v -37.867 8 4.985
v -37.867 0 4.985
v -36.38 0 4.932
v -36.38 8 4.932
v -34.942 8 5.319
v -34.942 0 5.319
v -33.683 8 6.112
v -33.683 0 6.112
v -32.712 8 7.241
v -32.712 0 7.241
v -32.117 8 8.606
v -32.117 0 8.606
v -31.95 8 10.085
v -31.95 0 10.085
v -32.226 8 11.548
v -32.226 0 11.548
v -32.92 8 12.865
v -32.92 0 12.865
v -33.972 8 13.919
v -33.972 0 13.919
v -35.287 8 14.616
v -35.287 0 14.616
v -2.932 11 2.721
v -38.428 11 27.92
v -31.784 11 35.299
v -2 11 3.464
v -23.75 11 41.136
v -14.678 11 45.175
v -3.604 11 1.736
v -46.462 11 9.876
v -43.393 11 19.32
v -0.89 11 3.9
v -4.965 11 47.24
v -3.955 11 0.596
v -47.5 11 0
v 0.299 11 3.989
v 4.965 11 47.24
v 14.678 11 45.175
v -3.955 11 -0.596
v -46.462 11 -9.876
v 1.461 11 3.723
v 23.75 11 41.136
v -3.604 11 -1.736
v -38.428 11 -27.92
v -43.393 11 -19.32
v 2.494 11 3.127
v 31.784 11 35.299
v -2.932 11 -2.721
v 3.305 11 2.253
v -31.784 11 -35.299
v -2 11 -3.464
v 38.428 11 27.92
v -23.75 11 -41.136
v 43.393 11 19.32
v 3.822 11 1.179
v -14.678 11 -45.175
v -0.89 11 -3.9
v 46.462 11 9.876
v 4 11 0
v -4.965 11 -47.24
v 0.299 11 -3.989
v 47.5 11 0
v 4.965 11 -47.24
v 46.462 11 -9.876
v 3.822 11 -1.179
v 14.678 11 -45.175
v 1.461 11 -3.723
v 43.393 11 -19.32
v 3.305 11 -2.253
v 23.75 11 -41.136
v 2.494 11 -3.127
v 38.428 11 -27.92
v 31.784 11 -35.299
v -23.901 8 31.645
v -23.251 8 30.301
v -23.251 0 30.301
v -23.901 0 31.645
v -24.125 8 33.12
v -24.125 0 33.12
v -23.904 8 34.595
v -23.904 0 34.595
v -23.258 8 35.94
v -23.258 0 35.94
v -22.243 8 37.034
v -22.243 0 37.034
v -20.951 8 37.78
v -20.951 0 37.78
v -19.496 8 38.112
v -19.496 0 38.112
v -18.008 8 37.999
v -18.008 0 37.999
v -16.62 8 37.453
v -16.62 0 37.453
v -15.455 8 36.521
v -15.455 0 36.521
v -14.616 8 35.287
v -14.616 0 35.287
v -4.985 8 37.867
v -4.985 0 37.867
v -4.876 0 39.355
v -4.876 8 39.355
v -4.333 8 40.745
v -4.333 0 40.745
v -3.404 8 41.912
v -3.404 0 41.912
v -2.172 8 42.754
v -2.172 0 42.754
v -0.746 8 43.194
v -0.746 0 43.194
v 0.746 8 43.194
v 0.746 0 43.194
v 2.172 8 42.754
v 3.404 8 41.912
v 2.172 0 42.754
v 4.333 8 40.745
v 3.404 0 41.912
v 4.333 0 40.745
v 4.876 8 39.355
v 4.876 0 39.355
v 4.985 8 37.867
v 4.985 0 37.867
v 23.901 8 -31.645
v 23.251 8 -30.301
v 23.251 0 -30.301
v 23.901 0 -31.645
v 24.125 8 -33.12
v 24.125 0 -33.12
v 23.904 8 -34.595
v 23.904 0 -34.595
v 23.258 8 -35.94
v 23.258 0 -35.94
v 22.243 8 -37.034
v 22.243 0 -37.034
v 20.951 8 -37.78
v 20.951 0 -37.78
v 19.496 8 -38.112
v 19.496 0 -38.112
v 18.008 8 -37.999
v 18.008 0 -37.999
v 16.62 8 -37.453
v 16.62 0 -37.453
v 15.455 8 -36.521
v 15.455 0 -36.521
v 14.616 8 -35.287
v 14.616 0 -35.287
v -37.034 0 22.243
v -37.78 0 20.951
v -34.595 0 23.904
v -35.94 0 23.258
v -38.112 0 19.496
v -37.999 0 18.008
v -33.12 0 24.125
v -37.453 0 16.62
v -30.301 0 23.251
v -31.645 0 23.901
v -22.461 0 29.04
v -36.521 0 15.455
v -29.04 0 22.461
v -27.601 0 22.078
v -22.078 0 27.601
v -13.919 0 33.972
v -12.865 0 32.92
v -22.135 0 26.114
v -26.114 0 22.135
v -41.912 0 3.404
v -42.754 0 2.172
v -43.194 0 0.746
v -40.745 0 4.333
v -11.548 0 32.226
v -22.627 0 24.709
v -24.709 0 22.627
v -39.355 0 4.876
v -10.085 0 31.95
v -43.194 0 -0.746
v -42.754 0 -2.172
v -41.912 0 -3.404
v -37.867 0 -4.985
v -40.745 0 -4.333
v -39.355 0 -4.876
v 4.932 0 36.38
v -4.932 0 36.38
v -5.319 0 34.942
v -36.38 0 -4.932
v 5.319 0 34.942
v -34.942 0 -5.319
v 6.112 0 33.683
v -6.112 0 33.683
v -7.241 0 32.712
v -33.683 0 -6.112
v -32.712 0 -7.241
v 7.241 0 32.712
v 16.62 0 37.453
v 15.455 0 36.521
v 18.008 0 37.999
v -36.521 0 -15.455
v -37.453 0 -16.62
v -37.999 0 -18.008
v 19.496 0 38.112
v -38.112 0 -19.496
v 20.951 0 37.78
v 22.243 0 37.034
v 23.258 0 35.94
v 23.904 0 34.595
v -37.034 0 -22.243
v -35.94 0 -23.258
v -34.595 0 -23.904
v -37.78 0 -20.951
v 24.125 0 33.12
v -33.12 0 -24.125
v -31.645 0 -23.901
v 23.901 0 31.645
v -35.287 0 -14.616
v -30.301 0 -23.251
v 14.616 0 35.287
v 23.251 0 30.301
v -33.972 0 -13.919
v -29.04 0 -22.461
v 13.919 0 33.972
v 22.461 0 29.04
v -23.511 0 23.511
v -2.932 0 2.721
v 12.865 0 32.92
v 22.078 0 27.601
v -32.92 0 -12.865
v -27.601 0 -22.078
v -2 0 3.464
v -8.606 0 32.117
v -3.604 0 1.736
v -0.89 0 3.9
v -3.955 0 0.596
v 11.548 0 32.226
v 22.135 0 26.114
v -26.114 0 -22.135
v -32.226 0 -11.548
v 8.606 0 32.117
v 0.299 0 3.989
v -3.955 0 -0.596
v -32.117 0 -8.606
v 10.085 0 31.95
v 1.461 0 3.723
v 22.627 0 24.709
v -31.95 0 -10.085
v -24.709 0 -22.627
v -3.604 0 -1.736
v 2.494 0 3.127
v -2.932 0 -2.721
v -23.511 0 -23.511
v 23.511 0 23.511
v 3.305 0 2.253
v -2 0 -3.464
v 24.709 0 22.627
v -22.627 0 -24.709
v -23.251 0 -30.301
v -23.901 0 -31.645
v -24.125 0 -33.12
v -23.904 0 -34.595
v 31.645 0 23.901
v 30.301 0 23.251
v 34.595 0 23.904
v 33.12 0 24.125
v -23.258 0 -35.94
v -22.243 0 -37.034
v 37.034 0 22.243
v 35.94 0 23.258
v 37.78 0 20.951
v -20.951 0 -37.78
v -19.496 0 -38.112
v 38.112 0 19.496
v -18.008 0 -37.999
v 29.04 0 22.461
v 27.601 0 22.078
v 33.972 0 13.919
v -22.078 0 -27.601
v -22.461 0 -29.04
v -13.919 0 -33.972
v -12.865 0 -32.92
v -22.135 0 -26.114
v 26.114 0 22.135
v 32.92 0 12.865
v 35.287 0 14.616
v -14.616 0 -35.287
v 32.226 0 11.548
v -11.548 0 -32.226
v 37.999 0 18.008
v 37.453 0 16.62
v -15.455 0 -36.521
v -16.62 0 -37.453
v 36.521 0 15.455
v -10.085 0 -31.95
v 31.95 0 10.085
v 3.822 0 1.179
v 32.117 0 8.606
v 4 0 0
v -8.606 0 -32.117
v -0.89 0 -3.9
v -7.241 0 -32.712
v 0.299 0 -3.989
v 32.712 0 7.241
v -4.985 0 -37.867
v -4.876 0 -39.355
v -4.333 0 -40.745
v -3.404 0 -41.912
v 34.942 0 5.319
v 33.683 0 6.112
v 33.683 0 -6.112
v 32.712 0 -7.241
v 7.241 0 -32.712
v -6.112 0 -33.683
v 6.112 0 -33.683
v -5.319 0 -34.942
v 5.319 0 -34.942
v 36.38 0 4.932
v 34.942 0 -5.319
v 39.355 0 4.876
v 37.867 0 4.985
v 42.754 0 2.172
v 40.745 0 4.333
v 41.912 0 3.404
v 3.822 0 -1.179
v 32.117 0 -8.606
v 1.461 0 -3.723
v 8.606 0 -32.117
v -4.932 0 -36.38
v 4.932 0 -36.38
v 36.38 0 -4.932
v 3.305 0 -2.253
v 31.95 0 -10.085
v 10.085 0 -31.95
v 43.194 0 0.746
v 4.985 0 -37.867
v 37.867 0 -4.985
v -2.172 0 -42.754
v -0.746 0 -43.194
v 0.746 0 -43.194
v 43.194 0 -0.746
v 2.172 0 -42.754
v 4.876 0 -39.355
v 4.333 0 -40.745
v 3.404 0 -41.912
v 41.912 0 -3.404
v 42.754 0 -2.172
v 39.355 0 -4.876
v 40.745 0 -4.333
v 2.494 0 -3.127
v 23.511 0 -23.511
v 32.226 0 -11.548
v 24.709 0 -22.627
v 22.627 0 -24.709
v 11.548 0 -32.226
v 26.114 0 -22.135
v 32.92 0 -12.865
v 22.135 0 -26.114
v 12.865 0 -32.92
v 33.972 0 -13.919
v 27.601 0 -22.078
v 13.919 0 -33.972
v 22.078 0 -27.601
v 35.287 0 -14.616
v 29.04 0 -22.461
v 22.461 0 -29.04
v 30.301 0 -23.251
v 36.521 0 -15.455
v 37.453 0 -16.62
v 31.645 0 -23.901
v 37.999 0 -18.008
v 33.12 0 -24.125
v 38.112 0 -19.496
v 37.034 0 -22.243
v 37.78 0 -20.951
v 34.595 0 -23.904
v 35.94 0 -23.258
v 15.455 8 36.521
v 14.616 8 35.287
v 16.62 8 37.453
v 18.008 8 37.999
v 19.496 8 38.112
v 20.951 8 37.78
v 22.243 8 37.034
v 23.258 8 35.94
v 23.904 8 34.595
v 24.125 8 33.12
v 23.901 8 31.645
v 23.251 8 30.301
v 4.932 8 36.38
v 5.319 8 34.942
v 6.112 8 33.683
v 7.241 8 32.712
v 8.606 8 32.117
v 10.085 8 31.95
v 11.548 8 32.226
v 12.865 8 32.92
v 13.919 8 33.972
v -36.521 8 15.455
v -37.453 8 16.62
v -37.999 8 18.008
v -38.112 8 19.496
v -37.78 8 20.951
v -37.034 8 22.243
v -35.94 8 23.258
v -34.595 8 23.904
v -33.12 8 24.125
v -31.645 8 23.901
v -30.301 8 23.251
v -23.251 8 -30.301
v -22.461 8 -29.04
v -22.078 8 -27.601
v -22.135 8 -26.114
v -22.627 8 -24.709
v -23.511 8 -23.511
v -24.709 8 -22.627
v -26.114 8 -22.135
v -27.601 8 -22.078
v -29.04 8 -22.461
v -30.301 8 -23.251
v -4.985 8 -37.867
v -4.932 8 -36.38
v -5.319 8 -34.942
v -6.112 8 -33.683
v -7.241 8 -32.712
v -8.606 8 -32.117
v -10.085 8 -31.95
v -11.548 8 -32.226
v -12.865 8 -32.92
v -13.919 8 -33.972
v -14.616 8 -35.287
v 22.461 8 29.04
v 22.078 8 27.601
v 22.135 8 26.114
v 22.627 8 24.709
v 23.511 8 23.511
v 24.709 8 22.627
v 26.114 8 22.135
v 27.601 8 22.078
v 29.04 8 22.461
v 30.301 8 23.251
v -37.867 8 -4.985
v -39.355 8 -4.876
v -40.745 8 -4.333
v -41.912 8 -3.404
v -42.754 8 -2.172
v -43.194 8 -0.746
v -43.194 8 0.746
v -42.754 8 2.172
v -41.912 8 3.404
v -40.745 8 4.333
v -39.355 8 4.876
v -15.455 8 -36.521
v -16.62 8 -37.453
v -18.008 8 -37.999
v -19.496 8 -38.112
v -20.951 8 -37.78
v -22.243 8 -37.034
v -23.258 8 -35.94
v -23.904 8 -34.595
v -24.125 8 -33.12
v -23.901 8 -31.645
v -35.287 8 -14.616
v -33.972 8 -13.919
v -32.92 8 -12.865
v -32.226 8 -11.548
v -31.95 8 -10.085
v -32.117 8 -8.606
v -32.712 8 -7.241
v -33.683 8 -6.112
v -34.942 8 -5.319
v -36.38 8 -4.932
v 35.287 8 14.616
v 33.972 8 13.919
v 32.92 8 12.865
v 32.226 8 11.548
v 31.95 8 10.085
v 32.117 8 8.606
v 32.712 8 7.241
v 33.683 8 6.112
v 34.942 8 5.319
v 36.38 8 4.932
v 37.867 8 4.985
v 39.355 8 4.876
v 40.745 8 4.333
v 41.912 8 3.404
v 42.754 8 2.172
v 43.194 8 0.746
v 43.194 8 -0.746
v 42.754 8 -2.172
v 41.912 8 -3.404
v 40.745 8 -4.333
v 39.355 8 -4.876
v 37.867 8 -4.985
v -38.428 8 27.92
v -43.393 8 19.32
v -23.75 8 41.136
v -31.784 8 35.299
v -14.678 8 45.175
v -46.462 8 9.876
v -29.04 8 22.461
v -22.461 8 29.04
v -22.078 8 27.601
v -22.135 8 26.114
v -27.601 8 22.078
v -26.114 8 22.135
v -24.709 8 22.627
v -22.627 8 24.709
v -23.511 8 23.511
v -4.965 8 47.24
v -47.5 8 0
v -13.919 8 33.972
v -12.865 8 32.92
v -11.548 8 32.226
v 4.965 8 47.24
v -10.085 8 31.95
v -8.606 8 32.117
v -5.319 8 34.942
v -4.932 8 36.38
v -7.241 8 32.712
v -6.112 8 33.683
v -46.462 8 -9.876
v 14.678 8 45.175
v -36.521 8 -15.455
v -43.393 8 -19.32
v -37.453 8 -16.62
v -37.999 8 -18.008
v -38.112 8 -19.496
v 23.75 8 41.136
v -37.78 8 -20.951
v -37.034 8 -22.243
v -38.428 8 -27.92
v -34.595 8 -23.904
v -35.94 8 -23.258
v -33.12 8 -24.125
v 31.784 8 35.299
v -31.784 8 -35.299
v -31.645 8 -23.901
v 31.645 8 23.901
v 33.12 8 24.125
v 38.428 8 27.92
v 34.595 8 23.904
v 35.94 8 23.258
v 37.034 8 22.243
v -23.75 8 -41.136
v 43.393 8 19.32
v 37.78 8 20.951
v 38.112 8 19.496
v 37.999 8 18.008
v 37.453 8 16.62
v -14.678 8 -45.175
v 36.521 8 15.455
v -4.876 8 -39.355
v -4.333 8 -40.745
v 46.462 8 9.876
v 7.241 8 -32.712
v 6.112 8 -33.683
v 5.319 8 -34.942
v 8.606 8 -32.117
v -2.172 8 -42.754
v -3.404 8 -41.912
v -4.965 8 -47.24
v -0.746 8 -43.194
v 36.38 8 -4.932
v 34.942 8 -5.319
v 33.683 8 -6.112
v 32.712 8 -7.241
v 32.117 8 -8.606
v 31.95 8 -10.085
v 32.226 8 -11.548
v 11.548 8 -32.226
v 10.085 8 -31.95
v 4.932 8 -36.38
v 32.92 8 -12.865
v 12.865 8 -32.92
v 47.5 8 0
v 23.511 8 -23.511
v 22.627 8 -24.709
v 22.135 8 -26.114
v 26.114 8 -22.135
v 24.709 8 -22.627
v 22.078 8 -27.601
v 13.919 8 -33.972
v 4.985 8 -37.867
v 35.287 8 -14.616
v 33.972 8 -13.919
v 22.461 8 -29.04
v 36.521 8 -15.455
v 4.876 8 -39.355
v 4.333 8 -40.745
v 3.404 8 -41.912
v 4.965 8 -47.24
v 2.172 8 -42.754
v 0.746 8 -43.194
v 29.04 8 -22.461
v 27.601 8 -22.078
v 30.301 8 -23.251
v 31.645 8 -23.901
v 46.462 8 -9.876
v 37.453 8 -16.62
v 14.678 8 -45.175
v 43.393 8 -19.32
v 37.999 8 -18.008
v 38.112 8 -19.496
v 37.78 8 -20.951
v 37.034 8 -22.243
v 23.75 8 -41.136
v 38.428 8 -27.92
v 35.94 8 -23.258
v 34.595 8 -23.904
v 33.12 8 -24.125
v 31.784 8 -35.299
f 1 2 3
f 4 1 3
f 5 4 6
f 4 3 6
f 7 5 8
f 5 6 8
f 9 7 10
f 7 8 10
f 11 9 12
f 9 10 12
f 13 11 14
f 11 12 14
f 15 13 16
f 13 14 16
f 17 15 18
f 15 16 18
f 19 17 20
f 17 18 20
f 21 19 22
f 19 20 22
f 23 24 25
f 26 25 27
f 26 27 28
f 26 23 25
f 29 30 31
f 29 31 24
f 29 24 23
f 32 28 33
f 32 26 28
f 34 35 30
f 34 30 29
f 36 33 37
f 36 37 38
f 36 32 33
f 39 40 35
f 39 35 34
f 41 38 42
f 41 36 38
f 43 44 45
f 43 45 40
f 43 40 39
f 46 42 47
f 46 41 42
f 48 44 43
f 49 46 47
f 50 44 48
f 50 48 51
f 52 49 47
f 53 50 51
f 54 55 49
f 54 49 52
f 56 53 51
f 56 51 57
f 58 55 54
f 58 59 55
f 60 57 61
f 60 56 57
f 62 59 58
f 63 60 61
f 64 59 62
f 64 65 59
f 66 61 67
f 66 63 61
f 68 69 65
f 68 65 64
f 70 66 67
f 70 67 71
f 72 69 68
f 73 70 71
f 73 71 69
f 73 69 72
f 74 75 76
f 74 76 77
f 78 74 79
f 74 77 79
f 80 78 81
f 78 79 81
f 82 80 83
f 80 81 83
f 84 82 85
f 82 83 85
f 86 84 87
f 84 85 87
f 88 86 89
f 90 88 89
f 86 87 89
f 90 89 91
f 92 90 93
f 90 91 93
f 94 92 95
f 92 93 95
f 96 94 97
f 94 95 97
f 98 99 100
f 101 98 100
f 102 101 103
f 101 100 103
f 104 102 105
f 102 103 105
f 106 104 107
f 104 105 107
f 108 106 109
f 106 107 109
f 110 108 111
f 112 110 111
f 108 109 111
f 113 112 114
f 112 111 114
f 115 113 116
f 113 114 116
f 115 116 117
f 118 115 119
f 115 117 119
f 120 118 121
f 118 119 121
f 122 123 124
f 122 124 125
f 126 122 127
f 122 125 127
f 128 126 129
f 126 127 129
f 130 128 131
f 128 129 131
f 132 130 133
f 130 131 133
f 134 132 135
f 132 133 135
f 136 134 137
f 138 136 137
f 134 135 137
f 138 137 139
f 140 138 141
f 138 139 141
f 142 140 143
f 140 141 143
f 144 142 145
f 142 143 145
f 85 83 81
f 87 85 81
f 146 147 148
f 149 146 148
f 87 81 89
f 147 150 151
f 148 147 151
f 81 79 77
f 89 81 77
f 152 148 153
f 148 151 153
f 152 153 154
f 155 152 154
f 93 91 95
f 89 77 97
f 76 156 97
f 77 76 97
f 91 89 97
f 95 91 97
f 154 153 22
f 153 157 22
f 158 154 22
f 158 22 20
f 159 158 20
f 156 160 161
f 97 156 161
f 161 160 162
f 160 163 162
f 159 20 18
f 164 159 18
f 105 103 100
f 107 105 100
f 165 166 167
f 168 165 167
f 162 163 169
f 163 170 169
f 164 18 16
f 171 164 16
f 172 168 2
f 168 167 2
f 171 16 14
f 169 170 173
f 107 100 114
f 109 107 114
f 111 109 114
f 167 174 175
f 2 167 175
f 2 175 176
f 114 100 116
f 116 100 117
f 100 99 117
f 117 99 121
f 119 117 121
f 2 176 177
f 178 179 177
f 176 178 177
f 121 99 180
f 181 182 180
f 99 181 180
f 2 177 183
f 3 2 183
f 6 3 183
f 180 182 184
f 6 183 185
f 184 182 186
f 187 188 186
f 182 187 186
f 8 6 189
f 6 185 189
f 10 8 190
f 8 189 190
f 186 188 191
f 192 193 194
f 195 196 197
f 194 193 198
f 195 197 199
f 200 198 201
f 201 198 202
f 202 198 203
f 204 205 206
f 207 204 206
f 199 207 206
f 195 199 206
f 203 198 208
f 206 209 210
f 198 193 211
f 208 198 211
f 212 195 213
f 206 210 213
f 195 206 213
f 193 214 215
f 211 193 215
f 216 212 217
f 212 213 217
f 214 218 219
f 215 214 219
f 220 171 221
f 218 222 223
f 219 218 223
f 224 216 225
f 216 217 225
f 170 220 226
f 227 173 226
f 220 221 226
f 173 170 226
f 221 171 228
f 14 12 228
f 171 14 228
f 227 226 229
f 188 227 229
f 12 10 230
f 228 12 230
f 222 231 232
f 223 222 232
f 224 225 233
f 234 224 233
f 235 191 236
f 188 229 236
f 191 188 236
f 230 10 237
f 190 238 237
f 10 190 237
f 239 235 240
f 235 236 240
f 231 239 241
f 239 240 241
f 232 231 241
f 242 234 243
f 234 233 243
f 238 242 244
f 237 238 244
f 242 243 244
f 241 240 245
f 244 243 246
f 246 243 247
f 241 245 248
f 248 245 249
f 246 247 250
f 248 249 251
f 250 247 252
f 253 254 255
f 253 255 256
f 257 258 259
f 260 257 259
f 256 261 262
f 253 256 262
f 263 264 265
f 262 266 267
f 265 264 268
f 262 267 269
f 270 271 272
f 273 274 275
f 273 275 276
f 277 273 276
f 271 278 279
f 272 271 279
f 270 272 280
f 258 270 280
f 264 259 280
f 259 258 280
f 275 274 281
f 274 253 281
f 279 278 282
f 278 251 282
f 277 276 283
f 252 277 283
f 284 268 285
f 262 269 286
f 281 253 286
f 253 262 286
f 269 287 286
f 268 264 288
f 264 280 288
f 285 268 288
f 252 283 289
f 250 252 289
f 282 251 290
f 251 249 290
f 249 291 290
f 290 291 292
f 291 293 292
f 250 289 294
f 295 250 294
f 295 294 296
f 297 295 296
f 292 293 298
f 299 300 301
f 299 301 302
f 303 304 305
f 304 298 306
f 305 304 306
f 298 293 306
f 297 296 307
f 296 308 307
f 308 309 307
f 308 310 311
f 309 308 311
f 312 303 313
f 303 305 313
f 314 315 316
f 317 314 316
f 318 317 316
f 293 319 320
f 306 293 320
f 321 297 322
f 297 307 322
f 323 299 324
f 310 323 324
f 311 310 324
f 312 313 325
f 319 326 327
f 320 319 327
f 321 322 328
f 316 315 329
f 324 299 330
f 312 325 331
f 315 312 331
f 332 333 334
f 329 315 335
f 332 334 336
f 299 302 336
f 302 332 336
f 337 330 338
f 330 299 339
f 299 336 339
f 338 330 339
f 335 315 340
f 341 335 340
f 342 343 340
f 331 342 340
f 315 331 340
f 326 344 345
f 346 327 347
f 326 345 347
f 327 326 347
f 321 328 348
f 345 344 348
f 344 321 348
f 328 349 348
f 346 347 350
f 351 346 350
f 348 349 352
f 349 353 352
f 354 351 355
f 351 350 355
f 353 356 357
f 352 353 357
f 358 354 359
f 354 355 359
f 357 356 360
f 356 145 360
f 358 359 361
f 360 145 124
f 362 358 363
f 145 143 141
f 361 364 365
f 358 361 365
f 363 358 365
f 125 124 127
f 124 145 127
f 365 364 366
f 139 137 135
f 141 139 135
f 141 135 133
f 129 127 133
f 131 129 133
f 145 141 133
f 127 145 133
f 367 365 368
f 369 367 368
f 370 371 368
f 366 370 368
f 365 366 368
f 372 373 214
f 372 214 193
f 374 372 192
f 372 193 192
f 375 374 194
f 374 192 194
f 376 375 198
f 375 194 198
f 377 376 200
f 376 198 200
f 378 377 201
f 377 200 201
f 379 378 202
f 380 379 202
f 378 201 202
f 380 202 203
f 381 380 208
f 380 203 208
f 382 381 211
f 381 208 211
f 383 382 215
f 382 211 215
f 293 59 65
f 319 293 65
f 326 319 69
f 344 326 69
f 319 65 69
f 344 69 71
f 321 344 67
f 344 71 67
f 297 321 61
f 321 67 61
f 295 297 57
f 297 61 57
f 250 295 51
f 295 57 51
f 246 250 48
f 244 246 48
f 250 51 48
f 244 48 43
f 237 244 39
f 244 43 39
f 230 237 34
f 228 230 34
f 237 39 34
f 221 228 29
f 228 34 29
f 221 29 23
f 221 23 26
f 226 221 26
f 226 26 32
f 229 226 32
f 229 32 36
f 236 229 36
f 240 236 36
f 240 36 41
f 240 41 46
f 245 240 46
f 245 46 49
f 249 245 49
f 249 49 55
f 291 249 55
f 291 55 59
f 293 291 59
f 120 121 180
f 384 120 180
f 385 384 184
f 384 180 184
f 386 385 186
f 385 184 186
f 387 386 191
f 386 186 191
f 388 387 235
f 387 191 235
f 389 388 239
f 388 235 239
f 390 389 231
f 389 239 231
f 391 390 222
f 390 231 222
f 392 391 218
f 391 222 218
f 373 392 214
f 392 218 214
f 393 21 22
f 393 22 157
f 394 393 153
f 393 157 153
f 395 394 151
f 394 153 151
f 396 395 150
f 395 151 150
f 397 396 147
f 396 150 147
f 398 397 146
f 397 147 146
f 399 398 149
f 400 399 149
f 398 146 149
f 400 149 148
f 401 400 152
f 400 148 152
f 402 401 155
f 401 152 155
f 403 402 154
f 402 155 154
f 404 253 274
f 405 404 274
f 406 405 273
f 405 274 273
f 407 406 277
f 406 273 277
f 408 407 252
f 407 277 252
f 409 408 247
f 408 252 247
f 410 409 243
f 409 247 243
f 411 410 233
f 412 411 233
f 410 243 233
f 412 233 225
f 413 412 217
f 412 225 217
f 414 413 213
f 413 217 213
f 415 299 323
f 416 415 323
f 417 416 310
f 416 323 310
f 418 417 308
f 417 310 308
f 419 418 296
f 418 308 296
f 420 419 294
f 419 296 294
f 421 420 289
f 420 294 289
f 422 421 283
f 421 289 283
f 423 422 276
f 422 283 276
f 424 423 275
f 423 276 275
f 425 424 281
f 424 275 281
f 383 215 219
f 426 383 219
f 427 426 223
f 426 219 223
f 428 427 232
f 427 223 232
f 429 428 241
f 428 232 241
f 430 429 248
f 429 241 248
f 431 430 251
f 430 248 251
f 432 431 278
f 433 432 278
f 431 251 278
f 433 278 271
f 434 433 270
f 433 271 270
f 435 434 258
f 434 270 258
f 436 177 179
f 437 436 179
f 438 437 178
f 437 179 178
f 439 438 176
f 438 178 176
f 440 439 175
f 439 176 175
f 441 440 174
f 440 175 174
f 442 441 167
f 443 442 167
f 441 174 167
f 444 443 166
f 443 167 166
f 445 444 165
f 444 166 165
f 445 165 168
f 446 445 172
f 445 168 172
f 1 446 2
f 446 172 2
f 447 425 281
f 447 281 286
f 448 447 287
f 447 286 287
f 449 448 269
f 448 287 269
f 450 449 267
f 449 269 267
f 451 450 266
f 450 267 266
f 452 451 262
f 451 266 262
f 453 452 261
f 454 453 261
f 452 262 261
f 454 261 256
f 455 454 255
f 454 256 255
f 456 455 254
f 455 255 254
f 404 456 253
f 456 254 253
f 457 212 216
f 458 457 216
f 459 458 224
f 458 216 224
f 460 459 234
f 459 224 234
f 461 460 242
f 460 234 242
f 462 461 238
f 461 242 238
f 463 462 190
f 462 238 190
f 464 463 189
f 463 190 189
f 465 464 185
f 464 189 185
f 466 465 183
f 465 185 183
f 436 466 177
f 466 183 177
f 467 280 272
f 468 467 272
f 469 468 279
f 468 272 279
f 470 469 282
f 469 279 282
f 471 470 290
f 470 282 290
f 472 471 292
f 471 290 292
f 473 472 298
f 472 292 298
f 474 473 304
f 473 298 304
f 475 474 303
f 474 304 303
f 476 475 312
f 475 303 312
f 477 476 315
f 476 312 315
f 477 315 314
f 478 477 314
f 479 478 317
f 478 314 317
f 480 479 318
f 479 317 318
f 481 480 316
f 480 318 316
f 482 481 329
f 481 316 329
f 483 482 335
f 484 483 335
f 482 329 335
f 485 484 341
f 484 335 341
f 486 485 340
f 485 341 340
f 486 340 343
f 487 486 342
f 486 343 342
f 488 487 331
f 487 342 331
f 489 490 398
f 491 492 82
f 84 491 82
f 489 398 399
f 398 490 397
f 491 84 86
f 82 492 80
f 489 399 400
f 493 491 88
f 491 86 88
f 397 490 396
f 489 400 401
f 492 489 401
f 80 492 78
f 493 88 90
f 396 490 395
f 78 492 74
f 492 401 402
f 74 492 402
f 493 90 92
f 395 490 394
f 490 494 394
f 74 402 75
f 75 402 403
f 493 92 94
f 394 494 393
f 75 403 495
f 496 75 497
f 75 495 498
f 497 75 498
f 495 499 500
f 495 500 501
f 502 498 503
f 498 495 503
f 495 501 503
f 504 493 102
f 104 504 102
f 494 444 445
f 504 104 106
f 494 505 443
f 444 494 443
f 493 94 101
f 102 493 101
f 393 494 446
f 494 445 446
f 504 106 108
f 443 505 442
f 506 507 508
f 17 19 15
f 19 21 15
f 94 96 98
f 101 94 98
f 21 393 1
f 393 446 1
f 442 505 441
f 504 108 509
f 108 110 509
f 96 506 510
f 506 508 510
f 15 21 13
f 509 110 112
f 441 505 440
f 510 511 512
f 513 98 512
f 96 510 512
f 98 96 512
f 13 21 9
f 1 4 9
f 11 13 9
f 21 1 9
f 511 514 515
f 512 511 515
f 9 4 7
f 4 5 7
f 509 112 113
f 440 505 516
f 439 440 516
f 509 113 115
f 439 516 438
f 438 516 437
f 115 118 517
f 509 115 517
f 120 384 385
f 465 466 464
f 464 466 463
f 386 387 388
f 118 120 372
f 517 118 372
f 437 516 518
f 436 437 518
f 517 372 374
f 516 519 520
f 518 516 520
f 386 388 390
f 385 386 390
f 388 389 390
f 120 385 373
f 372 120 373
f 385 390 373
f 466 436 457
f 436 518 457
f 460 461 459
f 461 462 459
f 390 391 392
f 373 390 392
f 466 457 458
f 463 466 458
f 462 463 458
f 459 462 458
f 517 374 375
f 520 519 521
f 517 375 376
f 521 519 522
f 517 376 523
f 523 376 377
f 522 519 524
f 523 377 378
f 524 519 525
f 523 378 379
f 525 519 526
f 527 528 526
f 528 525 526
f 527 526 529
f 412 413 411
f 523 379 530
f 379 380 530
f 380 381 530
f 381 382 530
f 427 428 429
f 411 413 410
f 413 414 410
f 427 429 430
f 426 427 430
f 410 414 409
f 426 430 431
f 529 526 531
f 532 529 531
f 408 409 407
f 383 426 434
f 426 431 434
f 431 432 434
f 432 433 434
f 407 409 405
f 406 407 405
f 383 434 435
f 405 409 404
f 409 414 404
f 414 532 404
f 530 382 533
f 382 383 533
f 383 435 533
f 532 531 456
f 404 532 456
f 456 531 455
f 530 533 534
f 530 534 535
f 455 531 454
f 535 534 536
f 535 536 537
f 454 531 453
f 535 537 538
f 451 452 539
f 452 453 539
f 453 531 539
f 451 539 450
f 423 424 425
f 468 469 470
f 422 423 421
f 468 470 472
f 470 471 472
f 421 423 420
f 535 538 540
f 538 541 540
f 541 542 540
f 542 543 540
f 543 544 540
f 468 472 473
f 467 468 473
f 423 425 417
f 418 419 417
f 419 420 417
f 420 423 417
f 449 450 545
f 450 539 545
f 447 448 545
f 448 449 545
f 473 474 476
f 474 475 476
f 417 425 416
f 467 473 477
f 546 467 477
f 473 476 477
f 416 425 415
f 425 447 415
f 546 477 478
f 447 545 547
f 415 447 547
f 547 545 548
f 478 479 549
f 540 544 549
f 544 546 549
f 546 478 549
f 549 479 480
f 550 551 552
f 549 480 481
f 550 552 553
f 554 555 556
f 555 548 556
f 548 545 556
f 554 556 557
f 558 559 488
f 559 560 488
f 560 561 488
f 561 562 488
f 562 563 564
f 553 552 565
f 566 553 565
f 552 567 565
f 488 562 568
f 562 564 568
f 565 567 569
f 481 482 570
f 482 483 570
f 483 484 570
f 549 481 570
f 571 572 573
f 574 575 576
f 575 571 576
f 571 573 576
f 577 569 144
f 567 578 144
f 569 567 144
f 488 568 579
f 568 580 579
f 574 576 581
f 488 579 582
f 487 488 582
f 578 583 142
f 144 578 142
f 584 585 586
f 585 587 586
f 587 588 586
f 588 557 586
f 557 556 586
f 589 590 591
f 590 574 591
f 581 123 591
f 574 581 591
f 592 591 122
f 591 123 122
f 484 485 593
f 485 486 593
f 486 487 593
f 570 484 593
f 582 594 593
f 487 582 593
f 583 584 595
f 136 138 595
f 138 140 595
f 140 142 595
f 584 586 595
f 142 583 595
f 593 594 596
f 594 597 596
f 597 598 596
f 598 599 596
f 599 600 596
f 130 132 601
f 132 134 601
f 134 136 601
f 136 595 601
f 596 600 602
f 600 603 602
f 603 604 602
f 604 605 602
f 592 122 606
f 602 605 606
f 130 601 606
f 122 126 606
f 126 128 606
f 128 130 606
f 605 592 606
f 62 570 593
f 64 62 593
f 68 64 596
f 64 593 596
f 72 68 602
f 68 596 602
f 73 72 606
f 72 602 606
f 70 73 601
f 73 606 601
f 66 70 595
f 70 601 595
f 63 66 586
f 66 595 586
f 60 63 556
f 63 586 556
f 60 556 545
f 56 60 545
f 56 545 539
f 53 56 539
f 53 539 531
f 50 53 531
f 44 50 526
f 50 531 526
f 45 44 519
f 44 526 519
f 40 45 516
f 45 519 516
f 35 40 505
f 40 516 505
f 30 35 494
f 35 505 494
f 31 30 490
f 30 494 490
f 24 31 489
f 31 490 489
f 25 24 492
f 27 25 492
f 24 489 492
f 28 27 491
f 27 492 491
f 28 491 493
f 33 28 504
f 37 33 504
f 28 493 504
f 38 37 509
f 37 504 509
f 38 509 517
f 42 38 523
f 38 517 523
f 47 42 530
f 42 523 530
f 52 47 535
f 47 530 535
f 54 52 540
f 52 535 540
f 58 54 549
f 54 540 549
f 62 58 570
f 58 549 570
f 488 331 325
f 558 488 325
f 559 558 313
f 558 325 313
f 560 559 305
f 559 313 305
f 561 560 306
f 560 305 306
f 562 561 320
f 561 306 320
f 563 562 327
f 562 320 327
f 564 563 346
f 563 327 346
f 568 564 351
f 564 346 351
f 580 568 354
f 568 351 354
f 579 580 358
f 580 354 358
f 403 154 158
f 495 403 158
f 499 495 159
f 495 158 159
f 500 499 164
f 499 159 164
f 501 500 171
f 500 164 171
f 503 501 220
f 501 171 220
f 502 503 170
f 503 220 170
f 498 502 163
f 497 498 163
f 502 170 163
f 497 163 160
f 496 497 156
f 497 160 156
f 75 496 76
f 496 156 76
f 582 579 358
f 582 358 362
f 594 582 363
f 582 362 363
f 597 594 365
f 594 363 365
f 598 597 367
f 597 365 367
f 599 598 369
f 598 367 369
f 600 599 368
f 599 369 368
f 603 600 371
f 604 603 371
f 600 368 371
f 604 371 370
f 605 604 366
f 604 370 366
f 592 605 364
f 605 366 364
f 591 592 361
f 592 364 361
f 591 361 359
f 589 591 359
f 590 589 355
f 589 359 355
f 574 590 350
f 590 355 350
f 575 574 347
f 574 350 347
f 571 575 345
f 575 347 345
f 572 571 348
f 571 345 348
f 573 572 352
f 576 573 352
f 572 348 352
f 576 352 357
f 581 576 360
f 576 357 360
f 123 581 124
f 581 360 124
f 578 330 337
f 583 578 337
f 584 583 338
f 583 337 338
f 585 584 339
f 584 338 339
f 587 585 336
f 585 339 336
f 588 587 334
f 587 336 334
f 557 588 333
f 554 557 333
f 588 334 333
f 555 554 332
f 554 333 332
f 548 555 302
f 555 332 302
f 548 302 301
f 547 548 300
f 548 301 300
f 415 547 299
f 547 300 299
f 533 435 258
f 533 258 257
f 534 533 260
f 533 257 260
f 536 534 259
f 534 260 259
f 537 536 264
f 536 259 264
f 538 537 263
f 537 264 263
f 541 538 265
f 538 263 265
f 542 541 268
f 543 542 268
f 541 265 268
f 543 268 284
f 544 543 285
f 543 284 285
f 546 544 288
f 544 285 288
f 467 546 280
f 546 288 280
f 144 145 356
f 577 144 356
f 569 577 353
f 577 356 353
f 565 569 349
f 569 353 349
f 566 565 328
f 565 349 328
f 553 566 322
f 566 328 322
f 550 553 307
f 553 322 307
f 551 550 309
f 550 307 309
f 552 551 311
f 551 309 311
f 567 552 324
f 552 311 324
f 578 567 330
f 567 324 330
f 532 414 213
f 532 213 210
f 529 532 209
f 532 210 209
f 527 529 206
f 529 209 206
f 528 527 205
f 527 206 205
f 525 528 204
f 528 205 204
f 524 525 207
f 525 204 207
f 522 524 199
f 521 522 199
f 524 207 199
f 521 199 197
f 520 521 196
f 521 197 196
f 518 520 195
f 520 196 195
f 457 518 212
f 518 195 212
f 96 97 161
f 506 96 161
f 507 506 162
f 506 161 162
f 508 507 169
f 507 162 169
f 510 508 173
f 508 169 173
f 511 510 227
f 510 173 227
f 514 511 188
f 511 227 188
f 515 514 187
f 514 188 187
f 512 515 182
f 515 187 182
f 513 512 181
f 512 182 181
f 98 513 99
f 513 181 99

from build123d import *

# Parameters (mm, degrees)
BOSS_EXTRUDE1_DEPTH = 8
SKETCH3_R           = 47.5
BOSS_EXTRUDE2_DEPTH = 3
SKETCH4_R           = 4
CUT_EXTRUDE1_DEPTH  = 30


with BuildPart() as part:
    # Sketch1 → Boss-Extrude1 (new body)
    with BuildSketch(Plane(origin=(0, 0, 0), x_dir=(1, 0, 0), z_dir=(0, 1, 0))):
        with BuildLine():
            ThreePointArc((37.867444544, -4.985343651), (43.25, 0), (37.867444544, 4.985343651))
            ThreePointArc((37.867444544, 4.985343651), (32.117033724, 8.60573325), (35.286840777, 14.616288023))
            ThreePointArc((35.286840777, 14.616288023), (37.455598714, 21.625), (30.301497126, 23.251156521))
            ThreePointArc((30.301497126, 23.251156521), (23.511300474, 23.511300474), (23.251156521, 30.301497126))
            ThreePointArc((23.251156521, 30.301497126), (21.625, 37.455598714), (14.616288023, 35.286840777))
            ThreePointArc((14.616288023, 35.286840777), (8.60573325, 32.117033724), (4.985343651, 37.867444544))
            ThreePointArc((4.985343651, 37.867444544), (0, 43.25), (-4.985343651, 37.867444544))
            ThreePointArc((-4.985343651, 37.867444544), (-8.60573325, 32.117033724), (-14.616288023, 35.286840777))
            ThreePointArc((-14.616288023, 35.286840777), (-21.625, 37.455598714), (-23.251156521, 30.301497126))
            ThreePointArc((-23.251156521, 30.301497126), (-23.511300474, 23.511300474), (-30.301497126, 23.251156521))
            ThreePointArc((-30.301497126, 23.251156521), (-37.455598714, 21.625), (-35.286840777, 14.616288023))
            ThreePointArc((-35.286840777, 14.616288023), (-32.117033724, 8.60573325), (-37.867444544, 4.985343651))
            ThreePointArc((-37.867444544, 4.985343651), (-43.25, 0), (-37.867444544, -4.985343651))
            ThreePointArc((-37.867444544, -4.985343651), (-32.117033724, -8.60573325), (-35.286840777, -14.616288023))
            ThreePointArc((-35.286840777, -14.616288023), (-37.455598714, -21.625), (-30.301497126, -23.251156521))
            ThreePointArc((-30.301497126, -23.251156521), (-23.511300474, -23.511300474), (-23.251156521, -30.301497126))
            ThreePointArc((-23.251156521, -30.301497126), (-21.625, -37.455598714), (-14.616288023, -35.286840777))
            ThreePointArc((-14.616288023, -35.286840777), (-8.60573325, -32.117033724), (-4.985343651, -37.867444544))
            ThreePointArc((-4.985343651, -37.867444544), (0, -43.25), (4.985343651, -37.867444544))
            ThreePointArc((4.985343651, -37.867444544), (8.60573325, -32.117033724), (14.616288023, -35.286840777))
            ThreePointArc((14.616288023, -35.286840777), (21.625, -37.455598714), (23.251156521, -30.301497126))
            ThreePointArc((23.251156521, -30.301497126), (23.511300474, -23.511300474), (30.301497126, -23.251156521))
            ThreePointArc((30.301497126, -23.251156521), (37.455598714, -21.625), (35.286840777, -14.616288023))
            ThreePointArc((35.286840777, -14.616288023), (32.117033724, -8.60573325), (37.867444544, -4.985343651))
        make_face()
    extrude(amount=BOSS_EXTRUDE1_DEPTH)

    # Sketch3 → Boss-Extrude2 (add)
    with BuildSketch(Plane(origin=(0, 8, 0), x_dir=(1, 0, 0), z_dir=(0, 1, 0))):
        Circle(SKETCH3_R)
    extrude(amount=BOSS_EXTRUDE2_DEPTH)

    # Sketch4 → Cut-Extrude1 (cut)
    with BuildSketch(Plane(origin=(0, 11, 0), x_dir=(1, 0, 0), z_dir=(0, 1, 0))):
        Circle(SKETCH4_R)
    extrude(amount=-CUT_EXTRUDE1_DEPTH, mode=Mode.SUBTRACT)


solid = part.part
